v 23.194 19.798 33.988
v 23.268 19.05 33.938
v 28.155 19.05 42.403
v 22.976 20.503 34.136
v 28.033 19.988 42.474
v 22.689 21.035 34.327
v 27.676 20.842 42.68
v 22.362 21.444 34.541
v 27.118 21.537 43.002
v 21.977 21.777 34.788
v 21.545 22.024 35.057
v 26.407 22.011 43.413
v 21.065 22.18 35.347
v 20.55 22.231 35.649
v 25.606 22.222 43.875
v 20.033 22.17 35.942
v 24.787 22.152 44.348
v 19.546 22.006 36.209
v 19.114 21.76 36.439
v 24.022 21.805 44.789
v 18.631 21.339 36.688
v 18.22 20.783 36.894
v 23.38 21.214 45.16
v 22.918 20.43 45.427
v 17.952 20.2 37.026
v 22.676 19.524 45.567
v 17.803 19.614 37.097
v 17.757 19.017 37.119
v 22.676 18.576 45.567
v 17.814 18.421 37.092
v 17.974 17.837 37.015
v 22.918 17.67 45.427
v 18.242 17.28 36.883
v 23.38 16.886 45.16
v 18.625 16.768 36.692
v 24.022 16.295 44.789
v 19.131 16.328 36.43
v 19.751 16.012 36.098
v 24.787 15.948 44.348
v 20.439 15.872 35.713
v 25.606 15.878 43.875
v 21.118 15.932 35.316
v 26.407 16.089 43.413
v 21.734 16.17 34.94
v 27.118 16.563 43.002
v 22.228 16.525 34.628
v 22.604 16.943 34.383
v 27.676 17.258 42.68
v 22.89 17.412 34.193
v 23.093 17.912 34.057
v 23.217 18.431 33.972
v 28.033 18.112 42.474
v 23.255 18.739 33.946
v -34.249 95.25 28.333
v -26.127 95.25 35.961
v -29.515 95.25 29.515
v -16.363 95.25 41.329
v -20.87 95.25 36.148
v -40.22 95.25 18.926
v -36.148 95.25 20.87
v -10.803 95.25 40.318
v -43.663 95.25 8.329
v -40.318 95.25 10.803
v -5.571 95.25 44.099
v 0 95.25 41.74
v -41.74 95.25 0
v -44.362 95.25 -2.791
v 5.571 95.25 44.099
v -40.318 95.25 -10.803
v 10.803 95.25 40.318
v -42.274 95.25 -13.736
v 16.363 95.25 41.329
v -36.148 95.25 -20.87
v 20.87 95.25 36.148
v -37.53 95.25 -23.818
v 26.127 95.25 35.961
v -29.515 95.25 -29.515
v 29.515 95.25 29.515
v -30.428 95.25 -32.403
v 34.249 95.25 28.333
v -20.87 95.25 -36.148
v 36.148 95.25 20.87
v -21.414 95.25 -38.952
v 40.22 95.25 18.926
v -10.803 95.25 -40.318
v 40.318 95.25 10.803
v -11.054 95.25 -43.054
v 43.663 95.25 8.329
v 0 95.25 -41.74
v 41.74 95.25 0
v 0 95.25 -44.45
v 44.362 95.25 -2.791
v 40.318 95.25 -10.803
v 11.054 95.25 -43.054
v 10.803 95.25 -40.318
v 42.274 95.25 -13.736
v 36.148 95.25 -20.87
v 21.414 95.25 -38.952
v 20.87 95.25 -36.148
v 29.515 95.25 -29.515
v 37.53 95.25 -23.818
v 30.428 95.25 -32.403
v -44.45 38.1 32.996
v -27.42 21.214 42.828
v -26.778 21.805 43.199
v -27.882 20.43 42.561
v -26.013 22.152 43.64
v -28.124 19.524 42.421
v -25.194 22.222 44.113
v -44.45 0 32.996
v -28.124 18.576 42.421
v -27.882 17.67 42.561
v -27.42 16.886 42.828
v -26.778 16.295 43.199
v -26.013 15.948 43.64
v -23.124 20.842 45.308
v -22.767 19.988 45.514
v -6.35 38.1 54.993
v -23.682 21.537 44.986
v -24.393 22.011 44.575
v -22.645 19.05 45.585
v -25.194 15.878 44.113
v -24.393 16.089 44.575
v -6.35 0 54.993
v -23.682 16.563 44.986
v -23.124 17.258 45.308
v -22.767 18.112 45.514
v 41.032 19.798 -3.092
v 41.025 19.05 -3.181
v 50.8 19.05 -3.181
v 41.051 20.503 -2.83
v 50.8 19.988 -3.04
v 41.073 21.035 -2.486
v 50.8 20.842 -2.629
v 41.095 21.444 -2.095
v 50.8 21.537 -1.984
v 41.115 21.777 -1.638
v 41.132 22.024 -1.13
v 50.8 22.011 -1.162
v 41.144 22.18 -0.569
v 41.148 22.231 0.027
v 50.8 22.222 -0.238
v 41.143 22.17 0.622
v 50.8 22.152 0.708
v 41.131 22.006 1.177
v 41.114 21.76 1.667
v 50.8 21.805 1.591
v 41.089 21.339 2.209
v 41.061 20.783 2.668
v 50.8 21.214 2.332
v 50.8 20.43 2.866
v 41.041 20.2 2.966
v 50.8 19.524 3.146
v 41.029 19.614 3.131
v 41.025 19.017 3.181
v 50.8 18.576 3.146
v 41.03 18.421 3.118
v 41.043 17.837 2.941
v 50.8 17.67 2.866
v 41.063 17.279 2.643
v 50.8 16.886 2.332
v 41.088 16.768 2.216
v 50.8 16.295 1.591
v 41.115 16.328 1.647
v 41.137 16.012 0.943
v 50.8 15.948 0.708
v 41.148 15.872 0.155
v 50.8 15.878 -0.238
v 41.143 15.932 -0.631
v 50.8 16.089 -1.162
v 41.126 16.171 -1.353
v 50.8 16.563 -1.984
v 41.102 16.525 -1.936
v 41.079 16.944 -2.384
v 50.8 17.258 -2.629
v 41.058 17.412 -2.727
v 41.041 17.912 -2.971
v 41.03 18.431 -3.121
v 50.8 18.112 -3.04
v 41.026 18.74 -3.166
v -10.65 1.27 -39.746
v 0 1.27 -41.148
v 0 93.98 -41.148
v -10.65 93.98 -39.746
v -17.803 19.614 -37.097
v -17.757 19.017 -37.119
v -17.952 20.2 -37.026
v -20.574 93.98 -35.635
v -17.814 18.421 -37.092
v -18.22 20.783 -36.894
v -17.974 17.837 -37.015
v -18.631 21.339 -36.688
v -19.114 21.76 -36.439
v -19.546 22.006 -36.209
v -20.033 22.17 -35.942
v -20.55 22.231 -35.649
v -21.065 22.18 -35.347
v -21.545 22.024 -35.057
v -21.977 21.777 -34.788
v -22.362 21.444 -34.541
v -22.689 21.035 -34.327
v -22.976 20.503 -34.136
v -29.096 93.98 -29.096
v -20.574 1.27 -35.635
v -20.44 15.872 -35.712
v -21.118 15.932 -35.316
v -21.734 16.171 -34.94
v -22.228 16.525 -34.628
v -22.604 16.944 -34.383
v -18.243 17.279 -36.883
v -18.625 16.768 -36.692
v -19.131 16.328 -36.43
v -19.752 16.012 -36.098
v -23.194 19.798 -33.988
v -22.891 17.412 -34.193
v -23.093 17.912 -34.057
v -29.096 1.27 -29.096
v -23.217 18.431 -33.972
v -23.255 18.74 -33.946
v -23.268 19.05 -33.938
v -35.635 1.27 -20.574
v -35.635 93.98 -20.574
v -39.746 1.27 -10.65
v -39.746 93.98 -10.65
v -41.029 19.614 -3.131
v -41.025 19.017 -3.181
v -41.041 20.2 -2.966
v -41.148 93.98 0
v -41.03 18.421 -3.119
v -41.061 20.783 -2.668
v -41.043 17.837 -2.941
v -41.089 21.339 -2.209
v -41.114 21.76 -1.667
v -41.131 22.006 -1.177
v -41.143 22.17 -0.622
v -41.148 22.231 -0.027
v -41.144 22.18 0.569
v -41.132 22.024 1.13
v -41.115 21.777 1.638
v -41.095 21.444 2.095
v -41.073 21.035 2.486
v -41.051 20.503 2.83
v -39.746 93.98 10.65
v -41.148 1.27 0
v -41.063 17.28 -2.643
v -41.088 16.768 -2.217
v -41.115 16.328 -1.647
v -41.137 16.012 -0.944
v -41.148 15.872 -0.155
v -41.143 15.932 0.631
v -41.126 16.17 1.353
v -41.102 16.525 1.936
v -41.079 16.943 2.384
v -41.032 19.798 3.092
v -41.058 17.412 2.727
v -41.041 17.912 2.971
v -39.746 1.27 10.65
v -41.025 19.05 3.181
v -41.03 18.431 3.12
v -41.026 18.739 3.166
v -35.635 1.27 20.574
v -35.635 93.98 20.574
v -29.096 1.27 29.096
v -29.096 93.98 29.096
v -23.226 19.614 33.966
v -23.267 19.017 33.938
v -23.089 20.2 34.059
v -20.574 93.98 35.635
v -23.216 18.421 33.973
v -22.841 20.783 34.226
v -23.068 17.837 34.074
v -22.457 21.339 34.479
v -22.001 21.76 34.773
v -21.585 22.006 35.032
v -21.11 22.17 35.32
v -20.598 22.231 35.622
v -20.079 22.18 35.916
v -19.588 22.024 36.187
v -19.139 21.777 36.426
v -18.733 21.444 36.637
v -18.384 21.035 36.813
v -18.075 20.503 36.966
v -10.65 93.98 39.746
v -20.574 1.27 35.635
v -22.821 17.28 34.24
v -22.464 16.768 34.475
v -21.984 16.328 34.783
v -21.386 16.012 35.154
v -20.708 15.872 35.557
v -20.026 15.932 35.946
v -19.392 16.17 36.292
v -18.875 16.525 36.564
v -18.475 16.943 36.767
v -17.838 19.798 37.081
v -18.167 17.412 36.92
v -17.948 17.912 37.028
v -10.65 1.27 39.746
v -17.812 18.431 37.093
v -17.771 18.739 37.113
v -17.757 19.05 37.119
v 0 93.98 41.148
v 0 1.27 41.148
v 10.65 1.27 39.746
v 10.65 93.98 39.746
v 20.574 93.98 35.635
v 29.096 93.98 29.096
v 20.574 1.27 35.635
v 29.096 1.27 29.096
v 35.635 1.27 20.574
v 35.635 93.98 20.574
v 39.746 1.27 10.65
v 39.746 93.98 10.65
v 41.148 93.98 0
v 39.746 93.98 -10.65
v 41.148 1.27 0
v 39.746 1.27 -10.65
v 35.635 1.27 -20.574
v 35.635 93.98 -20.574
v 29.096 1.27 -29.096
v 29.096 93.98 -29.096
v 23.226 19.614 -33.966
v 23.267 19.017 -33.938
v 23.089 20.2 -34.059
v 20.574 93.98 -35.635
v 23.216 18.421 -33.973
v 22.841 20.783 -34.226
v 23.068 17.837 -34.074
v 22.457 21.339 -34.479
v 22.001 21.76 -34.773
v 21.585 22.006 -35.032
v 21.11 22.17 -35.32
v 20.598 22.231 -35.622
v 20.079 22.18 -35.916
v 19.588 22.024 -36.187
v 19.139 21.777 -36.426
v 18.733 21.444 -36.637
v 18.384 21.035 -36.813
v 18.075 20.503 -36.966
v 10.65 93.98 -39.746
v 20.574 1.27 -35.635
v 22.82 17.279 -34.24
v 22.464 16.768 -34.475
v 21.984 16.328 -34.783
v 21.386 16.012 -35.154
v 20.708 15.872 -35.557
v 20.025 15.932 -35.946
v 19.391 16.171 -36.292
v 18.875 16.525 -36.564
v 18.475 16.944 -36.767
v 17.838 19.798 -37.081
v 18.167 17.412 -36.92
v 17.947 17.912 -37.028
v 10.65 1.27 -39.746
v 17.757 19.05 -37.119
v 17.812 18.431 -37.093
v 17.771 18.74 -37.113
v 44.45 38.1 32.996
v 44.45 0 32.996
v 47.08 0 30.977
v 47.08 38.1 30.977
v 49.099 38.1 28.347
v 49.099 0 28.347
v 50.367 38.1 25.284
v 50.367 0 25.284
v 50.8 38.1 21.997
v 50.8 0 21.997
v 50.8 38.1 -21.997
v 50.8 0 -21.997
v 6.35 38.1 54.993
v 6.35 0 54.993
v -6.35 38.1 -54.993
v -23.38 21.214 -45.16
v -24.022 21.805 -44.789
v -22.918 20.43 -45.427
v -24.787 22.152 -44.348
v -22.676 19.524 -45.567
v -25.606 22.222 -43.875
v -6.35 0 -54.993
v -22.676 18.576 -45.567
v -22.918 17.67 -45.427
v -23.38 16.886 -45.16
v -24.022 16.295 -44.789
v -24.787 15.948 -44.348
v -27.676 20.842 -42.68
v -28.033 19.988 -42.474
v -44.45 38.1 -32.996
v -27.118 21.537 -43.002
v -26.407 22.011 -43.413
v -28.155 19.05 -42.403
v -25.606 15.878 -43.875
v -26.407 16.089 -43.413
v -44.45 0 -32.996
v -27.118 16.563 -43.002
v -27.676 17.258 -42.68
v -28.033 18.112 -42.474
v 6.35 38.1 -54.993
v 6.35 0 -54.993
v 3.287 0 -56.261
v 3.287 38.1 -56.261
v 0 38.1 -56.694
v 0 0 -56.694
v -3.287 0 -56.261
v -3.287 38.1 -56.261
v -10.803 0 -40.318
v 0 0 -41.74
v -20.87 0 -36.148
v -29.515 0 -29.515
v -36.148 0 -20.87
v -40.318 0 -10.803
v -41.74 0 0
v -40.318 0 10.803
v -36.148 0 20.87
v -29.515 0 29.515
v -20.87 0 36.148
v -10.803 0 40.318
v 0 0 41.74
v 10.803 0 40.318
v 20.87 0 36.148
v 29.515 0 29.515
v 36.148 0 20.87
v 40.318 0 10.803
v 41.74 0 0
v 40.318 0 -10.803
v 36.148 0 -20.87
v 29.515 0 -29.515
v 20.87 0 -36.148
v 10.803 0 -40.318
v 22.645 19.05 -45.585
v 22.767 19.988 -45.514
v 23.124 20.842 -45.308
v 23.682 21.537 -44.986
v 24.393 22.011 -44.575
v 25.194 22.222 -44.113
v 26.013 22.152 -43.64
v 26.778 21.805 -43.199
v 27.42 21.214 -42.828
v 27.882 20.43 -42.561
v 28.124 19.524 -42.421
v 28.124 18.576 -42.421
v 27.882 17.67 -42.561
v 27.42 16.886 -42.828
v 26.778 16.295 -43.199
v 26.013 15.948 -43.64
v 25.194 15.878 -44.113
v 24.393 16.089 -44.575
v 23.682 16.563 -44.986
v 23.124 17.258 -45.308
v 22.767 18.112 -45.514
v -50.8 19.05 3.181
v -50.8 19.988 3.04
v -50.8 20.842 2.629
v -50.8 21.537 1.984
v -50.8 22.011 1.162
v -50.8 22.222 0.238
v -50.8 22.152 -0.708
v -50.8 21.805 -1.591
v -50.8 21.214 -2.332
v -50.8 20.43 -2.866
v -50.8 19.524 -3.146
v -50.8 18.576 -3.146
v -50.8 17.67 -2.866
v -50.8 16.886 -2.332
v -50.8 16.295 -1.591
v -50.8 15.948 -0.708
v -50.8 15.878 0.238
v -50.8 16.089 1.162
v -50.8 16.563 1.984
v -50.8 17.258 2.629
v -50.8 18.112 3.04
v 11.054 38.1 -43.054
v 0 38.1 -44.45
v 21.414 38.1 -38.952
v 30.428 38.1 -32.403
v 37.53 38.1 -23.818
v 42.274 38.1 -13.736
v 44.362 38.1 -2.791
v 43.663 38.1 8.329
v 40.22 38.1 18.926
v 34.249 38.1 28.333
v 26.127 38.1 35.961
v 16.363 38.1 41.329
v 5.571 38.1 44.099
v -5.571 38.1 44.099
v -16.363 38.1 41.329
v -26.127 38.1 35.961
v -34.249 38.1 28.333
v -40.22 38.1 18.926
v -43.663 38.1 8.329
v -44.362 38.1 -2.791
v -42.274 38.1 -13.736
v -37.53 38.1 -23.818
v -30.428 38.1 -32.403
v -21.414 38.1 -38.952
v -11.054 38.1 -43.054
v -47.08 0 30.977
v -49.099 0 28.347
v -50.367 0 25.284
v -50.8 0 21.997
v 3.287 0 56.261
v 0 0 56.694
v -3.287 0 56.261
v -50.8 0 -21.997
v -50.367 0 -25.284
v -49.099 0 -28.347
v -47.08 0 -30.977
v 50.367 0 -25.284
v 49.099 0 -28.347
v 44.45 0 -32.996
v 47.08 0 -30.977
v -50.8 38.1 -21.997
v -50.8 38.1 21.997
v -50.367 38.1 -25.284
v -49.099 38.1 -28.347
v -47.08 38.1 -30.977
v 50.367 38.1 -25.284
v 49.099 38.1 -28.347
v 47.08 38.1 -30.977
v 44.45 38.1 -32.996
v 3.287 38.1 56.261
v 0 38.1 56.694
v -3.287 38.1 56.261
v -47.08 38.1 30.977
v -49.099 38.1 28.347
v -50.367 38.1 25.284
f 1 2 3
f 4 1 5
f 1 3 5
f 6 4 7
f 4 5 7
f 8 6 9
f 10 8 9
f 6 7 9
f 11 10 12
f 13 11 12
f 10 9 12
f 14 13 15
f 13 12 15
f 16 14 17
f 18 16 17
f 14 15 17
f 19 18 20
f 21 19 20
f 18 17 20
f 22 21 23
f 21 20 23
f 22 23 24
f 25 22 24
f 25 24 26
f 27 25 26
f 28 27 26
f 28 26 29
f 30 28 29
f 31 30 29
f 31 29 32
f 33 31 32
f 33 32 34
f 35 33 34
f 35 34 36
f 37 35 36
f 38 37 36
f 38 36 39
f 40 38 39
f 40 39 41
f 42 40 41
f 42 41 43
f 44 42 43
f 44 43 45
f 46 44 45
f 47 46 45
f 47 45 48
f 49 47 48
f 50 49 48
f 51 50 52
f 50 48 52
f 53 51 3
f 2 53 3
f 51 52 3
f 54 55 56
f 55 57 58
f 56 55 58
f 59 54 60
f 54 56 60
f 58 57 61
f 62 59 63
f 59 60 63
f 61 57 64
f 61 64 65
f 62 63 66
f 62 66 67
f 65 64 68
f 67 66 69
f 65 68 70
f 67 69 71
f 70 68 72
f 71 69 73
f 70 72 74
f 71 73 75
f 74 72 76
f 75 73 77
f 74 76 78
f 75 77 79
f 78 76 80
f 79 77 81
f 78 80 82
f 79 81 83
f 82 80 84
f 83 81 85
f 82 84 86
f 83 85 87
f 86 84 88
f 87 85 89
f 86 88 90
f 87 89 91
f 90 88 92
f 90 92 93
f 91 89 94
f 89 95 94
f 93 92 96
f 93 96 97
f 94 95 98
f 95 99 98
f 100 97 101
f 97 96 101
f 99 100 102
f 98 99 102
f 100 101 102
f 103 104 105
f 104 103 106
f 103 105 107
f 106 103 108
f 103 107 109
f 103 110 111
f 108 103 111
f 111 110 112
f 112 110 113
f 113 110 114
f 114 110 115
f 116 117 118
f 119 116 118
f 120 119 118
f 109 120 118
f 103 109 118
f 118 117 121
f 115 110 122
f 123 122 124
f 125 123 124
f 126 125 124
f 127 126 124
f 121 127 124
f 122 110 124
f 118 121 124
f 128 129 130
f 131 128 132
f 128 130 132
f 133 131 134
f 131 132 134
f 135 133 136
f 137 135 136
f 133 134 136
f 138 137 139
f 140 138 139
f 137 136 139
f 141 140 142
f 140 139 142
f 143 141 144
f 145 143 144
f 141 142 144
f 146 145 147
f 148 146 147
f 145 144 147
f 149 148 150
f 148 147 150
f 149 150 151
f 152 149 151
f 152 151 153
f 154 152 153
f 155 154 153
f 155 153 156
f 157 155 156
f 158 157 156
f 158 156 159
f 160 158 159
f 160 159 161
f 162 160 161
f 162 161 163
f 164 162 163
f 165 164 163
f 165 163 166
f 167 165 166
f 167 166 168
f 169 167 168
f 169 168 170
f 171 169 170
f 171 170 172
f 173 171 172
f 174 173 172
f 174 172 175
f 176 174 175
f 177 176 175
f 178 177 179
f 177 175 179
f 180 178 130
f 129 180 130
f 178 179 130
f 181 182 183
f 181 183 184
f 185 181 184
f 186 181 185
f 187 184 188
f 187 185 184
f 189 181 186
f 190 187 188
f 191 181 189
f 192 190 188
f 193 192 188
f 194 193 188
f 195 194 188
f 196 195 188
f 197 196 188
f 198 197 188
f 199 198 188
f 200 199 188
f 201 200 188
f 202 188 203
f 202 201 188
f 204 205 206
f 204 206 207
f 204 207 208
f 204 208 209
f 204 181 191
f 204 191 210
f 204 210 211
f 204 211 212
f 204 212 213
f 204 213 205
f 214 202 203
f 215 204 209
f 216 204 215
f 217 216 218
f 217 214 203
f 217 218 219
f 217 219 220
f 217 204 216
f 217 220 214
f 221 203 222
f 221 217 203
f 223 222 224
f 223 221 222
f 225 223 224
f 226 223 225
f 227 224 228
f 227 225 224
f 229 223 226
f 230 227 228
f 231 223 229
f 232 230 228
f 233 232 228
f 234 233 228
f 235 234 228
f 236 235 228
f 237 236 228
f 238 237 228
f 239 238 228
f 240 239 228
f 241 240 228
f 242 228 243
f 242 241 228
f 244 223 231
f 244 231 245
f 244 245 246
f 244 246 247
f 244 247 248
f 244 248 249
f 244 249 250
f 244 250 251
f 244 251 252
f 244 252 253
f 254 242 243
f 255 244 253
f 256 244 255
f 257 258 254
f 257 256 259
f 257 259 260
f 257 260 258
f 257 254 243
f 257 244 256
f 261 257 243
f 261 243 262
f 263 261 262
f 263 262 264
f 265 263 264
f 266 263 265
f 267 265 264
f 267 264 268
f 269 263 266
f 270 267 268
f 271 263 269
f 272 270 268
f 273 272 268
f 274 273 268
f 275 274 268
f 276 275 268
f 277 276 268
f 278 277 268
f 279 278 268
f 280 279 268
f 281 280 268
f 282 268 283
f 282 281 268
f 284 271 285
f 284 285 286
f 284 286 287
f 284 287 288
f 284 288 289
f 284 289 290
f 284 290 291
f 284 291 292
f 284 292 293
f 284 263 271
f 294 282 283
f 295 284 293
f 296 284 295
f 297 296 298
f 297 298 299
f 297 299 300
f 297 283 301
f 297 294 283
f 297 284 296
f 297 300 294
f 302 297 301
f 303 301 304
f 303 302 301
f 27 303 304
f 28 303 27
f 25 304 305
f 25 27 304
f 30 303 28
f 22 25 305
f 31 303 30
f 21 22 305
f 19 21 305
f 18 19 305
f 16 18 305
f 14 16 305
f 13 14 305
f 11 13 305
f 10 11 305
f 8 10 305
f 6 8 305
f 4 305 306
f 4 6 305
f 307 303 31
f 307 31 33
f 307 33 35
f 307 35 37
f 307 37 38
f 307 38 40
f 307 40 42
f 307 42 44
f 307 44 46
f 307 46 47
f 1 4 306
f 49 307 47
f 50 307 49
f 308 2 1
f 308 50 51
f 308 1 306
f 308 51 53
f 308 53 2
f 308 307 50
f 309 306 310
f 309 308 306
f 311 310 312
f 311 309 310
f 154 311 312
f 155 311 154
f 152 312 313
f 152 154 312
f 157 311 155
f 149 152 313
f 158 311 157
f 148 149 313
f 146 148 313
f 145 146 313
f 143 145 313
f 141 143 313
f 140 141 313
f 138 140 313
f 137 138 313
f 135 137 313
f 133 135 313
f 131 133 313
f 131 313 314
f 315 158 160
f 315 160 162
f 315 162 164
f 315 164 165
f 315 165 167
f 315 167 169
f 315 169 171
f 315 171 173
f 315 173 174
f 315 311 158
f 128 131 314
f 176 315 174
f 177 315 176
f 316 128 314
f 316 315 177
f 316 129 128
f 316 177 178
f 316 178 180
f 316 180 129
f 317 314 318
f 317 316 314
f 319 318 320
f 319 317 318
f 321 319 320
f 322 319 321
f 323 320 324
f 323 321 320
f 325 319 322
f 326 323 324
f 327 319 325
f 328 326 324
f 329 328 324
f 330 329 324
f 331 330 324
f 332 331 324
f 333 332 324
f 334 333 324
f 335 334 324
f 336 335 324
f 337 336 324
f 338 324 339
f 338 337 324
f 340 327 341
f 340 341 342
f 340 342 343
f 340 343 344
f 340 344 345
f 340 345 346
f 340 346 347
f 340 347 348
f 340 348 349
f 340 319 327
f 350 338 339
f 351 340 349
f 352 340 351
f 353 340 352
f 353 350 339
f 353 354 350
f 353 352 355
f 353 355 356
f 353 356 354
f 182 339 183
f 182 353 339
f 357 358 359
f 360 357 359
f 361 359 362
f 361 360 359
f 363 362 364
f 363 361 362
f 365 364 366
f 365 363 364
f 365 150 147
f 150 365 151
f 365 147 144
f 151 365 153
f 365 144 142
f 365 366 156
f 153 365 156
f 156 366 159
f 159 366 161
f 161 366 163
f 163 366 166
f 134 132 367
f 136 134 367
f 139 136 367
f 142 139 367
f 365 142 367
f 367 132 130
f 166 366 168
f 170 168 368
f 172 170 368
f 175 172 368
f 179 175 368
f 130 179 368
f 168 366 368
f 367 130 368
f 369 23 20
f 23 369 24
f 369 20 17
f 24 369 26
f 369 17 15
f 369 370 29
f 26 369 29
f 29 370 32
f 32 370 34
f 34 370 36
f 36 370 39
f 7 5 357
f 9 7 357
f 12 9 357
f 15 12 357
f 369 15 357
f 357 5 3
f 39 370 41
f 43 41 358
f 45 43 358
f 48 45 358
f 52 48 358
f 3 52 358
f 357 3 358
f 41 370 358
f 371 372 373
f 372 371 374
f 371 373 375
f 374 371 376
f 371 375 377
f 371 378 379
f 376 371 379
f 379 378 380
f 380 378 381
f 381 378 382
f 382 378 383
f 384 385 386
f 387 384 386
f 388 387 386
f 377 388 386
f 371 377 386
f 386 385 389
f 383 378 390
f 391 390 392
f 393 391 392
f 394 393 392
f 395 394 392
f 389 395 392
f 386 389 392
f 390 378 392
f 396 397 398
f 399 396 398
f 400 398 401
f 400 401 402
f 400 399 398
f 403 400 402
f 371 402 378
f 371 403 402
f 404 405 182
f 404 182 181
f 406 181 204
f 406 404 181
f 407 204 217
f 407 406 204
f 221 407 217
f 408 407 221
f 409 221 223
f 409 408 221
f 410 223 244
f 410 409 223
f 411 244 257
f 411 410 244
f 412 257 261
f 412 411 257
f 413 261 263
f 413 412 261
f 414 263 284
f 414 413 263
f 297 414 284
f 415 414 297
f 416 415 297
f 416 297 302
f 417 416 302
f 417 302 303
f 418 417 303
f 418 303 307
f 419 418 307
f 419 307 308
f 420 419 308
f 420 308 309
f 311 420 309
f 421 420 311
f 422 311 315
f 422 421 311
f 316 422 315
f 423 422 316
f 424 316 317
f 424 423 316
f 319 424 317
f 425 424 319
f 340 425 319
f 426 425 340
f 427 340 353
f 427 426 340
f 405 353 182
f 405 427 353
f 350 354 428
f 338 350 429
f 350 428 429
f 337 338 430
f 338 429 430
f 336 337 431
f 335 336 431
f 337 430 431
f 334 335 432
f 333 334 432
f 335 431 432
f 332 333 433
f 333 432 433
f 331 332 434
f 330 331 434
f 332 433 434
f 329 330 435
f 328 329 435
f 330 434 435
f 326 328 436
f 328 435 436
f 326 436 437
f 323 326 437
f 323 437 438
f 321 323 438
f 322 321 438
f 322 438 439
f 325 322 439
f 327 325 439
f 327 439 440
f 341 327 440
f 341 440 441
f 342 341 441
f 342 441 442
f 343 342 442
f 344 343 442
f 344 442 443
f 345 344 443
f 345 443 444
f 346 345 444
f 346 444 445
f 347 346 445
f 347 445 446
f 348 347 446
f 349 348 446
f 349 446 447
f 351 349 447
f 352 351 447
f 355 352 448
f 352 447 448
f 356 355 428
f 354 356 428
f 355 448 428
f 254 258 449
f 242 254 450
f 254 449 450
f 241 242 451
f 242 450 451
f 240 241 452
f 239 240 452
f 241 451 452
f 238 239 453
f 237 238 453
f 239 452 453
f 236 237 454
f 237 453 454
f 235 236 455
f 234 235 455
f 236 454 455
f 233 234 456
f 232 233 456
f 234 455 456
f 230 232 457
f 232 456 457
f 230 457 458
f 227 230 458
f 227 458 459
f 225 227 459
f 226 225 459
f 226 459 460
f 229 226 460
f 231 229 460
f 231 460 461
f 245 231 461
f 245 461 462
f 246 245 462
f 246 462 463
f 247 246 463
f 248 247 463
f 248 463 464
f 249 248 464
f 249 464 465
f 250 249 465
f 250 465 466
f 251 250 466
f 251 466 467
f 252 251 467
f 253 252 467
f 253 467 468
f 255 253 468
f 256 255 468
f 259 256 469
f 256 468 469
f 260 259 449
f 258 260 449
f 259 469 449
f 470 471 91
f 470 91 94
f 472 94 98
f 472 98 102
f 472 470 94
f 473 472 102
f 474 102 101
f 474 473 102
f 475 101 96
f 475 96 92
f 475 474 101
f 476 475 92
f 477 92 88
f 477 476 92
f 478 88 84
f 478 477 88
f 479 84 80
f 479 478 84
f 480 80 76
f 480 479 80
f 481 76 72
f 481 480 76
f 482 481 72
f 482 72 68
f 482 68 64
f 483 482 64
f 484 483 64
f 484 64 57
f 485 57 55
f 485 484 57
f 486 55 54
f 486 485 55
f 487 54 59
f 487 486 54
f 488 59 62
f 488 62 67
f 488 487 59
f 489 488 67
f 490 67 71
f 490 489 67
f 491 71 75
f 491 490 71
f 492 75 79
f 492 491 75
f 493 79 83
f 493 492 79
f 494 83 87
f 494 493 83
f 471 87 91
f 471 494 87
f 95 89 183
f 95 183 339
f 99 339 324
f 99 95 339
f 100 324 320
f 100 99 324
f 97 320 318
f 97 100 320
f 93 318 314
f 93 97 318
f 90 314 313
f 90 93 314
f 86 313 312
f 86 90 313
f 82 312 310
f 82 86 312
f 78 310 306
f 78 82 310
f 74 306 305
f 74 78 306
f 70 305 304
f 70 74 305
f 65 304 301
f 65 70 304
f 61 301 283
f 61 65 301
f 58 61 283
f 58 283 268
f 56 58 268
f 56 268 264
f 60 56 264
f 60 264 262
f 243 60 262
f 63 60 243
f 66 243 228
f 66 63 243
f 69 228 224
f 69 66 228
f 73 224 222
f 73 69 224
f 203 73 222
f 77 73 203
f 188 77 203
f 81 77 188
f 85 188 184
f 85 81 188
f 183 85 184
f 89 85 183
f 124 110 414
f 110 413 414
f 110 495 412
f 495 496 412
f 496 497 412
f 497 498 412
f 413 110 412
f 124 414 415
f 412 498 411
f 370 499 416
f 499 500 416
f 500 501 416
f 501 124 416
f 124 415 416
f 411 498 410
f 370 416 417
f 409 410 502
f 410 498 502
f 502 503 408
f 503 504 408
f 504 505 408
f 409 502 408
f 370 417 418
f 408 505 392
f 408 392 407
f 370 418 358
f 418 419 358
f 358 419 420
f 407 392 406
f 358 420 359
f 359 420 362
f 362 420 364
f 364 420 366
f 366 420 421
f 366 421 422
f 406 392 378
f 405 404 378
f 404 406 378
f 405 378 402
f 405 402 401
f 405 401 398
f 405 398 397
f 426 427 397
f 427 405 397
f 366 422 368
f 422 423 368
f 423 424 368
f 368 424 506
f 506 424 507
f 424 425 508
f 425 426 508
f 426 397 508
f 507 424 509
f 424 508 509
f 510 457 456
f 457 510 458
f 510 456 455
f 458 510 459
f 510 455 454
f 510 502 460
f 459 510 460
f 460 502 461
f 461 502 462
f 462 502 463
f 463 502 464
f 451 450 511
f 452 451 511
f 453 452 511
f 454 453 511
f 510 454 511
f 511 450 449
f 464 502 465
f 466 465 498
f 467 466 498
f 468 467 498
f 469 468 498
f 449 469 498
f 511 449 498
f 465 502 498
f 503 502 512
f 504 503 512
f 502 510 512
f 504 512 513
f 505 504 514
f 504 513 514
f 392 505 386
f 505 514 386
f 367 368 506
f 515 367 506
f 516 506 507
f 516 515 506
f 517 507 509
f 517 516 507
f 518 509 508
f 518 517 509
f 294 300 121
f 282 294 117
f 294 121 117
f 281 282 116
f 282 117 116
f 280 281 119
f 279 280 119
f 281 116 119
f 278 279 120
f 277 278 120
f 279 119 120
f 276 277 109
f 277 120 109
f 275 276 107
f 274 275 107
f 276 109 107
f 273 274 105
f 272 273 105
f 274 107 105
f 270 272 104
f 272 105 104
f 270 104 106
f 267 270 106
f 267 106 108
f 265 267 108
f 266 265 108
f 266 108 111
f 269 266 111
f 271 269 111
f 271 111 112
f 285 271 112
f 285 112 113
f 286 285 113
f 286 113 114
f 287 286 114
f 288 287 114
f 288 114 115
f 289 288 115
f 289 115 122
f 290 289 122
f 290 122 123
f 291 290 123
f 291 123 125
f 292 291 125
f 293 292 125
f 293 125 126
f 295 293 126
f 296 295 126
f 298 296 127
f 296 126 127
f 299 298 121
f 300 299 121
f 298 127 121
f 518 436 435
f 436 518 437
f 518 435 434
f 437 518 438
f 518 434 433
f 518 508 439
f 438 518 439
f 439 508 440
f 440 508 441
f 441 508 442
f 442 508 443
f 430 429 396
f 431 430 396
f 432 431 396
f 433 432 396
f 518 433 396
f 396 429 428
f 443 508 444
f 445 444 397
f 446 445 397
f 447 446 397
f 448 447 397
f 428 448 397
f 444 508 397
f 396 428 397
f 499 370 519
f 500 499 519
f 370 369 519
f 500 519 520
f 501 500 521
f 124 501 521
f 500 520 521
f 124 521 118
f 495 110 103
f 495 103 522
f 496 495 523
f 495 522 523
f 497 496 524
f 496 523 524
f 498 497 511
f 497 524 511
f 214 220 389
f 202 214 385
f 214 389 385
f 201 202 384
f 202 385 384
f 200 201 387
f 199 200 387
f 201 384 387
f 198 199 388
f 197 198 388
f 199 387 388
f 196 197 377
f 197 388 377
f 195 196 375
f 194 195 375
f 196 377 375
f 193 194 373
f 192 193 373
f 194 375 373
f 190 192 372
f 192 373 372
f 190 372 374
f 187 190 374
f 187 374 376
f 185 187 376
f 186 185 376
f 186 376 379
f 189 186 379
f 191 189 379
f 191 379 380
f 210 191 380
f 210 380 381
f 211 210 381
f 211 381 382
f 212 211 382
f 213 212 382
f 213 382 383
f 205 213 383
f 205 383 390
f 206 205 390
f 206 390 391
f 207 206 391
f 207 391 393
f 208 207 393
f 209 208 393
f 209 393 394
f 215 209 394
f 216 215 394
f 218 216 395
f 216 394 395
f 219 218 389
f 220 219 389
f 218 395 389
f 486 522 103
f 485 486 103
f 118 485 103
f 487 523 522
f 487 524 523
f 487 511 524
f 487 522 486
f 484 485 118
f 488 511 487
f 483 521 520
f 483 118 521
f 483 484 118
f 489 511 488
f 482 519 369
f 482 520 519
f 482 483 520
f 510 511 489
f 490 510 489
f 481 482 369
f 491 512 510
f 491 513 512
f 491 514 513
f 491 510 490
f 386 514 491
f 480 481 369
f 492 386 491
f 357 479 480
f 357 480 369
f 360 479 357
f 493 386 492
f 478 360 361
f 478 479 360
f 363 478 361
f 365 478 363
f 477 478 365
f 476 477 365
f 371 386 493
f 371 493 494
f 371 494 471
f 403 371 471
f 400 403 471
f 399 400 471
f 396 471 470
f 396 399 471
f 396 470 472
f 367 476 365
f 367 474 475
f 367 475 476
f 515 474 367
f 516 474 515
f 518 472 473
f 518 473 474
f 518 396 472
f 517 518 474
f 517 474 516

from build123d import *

# Parameters (mm, degrees)
SKETCH1_R           = 41.148
BOSS_EXTRUDE1_DEPTH = 38.1
SKETCH2_R           = 3.18135
CUT_EXTRUDE1_DEPTH  = 29.464
CIRPATTERN1_COUNT   = 6
SKETCH3_R           = 44.45
SKETCH3_R_2         = 41.148
BOSS_EXTRUDE2_DEPTH = 57.15
FILLET1_R           = 12.7
CHAMFER1_SIZE       = 1.27
CHAMFER1_SIZE2      = 0.592210726


with BuildPart() as part:
    # Sketch1 → Boss-Extrude1 (new body)
    with BuildSketch(Plane(origin=(0, 0, 0), x_dir=(1, 0, 0), z_dir=(0, 1, 0))):
        Polygon((0, -58.65878735), (50.8, -29.329393675), (50.8, 29.329393675), (0, 58.65878735), (-50.8, 29.329393675), (-50.8, -29.329393675), align=None)
        with Locations(Location((0, 0, 0), (0, 0, 90))):
            Circle(SKETCH1_R, mode=Mode.SUBTRACT)
    extrude(amount=BOSS_EXTRUDE1_DEPTH)

    # Sketch2 → Cut-Extrude1 (cut)
    with BuildSketch(Plane.ZY.offset(50.8)):
        with Locations((0, 19.05)):
            Circle(SKETCH2_R)
    cut_extrude1 = extrude(amount=-CUT_EXTRUDE1_DEPTH, mode=Mode.SUBTRACT)

    # CirPattern1: Cut-Extrude1 ×6 about axis
    cirpattern1_axis = Axis((0, 38.1, 0), (0, 1, 0))
    for i in range(1, CIRPATTERN1_COUNT):
        add(cut_extrude1.rotate(cirpattern1_axis, i * 360 / CIRPATTERN1_COUNT), mode=Mode.SUBTRACT)

    # Sketch3 → Boss-Extrude2 (add)
    with BuildSketch(Plane(origin=(-50.8, 38.1, -29.329393675), x_dir=(1, 0, 0), z_dir=(0, -1, 0))):
        with Locations(Location((50.8, 29.329393675, 0), (0, 0, 270))):
            Circle(SKETCH3_R)
        with Locations(Location((50.8, 29.329393675, 0), (0, 0, 270))):
            Circle(SKETCH3_R_2, mode=Mode.SUBTRACT)
    extrude(amount=-BOSS_EXTRUDE2_DEPTH)

    # Fillet1
    fillet1_edges = [part.edges().sort_by_distance(p)[0] for p in [
        (-50.8, 19.05, 29.329393675),
        (-50.8, 19.05, -29.329393675),
        (0, 19.05, -58.65878735),
        (50.8, 19.05, -29.329393675),
        (50.8, 19.05, 29.329393675),
        (0, 19.05, 58.65878735),
    ]]
    fillet(fillet1_edges, radius=FILLET1_R)

    # Chamfer1
    chamfer1_edges = [part.edges().sort_by_distance(p)[0] for p in [
        (0, 0, 41.148),
        (0, 95.25, 41.148),
    ]]
    chamfer1_side = [part.faces().sort_by_distance(p)[0] for p in [
        (0, 47.625, 41.148),
    ]]
    chamfer(chamfer1_edges, length=CHAMFER1_SIZE, length2=CHAMFER1_SIZE2, reference=chamfer1_side[0])


solid = part.part
